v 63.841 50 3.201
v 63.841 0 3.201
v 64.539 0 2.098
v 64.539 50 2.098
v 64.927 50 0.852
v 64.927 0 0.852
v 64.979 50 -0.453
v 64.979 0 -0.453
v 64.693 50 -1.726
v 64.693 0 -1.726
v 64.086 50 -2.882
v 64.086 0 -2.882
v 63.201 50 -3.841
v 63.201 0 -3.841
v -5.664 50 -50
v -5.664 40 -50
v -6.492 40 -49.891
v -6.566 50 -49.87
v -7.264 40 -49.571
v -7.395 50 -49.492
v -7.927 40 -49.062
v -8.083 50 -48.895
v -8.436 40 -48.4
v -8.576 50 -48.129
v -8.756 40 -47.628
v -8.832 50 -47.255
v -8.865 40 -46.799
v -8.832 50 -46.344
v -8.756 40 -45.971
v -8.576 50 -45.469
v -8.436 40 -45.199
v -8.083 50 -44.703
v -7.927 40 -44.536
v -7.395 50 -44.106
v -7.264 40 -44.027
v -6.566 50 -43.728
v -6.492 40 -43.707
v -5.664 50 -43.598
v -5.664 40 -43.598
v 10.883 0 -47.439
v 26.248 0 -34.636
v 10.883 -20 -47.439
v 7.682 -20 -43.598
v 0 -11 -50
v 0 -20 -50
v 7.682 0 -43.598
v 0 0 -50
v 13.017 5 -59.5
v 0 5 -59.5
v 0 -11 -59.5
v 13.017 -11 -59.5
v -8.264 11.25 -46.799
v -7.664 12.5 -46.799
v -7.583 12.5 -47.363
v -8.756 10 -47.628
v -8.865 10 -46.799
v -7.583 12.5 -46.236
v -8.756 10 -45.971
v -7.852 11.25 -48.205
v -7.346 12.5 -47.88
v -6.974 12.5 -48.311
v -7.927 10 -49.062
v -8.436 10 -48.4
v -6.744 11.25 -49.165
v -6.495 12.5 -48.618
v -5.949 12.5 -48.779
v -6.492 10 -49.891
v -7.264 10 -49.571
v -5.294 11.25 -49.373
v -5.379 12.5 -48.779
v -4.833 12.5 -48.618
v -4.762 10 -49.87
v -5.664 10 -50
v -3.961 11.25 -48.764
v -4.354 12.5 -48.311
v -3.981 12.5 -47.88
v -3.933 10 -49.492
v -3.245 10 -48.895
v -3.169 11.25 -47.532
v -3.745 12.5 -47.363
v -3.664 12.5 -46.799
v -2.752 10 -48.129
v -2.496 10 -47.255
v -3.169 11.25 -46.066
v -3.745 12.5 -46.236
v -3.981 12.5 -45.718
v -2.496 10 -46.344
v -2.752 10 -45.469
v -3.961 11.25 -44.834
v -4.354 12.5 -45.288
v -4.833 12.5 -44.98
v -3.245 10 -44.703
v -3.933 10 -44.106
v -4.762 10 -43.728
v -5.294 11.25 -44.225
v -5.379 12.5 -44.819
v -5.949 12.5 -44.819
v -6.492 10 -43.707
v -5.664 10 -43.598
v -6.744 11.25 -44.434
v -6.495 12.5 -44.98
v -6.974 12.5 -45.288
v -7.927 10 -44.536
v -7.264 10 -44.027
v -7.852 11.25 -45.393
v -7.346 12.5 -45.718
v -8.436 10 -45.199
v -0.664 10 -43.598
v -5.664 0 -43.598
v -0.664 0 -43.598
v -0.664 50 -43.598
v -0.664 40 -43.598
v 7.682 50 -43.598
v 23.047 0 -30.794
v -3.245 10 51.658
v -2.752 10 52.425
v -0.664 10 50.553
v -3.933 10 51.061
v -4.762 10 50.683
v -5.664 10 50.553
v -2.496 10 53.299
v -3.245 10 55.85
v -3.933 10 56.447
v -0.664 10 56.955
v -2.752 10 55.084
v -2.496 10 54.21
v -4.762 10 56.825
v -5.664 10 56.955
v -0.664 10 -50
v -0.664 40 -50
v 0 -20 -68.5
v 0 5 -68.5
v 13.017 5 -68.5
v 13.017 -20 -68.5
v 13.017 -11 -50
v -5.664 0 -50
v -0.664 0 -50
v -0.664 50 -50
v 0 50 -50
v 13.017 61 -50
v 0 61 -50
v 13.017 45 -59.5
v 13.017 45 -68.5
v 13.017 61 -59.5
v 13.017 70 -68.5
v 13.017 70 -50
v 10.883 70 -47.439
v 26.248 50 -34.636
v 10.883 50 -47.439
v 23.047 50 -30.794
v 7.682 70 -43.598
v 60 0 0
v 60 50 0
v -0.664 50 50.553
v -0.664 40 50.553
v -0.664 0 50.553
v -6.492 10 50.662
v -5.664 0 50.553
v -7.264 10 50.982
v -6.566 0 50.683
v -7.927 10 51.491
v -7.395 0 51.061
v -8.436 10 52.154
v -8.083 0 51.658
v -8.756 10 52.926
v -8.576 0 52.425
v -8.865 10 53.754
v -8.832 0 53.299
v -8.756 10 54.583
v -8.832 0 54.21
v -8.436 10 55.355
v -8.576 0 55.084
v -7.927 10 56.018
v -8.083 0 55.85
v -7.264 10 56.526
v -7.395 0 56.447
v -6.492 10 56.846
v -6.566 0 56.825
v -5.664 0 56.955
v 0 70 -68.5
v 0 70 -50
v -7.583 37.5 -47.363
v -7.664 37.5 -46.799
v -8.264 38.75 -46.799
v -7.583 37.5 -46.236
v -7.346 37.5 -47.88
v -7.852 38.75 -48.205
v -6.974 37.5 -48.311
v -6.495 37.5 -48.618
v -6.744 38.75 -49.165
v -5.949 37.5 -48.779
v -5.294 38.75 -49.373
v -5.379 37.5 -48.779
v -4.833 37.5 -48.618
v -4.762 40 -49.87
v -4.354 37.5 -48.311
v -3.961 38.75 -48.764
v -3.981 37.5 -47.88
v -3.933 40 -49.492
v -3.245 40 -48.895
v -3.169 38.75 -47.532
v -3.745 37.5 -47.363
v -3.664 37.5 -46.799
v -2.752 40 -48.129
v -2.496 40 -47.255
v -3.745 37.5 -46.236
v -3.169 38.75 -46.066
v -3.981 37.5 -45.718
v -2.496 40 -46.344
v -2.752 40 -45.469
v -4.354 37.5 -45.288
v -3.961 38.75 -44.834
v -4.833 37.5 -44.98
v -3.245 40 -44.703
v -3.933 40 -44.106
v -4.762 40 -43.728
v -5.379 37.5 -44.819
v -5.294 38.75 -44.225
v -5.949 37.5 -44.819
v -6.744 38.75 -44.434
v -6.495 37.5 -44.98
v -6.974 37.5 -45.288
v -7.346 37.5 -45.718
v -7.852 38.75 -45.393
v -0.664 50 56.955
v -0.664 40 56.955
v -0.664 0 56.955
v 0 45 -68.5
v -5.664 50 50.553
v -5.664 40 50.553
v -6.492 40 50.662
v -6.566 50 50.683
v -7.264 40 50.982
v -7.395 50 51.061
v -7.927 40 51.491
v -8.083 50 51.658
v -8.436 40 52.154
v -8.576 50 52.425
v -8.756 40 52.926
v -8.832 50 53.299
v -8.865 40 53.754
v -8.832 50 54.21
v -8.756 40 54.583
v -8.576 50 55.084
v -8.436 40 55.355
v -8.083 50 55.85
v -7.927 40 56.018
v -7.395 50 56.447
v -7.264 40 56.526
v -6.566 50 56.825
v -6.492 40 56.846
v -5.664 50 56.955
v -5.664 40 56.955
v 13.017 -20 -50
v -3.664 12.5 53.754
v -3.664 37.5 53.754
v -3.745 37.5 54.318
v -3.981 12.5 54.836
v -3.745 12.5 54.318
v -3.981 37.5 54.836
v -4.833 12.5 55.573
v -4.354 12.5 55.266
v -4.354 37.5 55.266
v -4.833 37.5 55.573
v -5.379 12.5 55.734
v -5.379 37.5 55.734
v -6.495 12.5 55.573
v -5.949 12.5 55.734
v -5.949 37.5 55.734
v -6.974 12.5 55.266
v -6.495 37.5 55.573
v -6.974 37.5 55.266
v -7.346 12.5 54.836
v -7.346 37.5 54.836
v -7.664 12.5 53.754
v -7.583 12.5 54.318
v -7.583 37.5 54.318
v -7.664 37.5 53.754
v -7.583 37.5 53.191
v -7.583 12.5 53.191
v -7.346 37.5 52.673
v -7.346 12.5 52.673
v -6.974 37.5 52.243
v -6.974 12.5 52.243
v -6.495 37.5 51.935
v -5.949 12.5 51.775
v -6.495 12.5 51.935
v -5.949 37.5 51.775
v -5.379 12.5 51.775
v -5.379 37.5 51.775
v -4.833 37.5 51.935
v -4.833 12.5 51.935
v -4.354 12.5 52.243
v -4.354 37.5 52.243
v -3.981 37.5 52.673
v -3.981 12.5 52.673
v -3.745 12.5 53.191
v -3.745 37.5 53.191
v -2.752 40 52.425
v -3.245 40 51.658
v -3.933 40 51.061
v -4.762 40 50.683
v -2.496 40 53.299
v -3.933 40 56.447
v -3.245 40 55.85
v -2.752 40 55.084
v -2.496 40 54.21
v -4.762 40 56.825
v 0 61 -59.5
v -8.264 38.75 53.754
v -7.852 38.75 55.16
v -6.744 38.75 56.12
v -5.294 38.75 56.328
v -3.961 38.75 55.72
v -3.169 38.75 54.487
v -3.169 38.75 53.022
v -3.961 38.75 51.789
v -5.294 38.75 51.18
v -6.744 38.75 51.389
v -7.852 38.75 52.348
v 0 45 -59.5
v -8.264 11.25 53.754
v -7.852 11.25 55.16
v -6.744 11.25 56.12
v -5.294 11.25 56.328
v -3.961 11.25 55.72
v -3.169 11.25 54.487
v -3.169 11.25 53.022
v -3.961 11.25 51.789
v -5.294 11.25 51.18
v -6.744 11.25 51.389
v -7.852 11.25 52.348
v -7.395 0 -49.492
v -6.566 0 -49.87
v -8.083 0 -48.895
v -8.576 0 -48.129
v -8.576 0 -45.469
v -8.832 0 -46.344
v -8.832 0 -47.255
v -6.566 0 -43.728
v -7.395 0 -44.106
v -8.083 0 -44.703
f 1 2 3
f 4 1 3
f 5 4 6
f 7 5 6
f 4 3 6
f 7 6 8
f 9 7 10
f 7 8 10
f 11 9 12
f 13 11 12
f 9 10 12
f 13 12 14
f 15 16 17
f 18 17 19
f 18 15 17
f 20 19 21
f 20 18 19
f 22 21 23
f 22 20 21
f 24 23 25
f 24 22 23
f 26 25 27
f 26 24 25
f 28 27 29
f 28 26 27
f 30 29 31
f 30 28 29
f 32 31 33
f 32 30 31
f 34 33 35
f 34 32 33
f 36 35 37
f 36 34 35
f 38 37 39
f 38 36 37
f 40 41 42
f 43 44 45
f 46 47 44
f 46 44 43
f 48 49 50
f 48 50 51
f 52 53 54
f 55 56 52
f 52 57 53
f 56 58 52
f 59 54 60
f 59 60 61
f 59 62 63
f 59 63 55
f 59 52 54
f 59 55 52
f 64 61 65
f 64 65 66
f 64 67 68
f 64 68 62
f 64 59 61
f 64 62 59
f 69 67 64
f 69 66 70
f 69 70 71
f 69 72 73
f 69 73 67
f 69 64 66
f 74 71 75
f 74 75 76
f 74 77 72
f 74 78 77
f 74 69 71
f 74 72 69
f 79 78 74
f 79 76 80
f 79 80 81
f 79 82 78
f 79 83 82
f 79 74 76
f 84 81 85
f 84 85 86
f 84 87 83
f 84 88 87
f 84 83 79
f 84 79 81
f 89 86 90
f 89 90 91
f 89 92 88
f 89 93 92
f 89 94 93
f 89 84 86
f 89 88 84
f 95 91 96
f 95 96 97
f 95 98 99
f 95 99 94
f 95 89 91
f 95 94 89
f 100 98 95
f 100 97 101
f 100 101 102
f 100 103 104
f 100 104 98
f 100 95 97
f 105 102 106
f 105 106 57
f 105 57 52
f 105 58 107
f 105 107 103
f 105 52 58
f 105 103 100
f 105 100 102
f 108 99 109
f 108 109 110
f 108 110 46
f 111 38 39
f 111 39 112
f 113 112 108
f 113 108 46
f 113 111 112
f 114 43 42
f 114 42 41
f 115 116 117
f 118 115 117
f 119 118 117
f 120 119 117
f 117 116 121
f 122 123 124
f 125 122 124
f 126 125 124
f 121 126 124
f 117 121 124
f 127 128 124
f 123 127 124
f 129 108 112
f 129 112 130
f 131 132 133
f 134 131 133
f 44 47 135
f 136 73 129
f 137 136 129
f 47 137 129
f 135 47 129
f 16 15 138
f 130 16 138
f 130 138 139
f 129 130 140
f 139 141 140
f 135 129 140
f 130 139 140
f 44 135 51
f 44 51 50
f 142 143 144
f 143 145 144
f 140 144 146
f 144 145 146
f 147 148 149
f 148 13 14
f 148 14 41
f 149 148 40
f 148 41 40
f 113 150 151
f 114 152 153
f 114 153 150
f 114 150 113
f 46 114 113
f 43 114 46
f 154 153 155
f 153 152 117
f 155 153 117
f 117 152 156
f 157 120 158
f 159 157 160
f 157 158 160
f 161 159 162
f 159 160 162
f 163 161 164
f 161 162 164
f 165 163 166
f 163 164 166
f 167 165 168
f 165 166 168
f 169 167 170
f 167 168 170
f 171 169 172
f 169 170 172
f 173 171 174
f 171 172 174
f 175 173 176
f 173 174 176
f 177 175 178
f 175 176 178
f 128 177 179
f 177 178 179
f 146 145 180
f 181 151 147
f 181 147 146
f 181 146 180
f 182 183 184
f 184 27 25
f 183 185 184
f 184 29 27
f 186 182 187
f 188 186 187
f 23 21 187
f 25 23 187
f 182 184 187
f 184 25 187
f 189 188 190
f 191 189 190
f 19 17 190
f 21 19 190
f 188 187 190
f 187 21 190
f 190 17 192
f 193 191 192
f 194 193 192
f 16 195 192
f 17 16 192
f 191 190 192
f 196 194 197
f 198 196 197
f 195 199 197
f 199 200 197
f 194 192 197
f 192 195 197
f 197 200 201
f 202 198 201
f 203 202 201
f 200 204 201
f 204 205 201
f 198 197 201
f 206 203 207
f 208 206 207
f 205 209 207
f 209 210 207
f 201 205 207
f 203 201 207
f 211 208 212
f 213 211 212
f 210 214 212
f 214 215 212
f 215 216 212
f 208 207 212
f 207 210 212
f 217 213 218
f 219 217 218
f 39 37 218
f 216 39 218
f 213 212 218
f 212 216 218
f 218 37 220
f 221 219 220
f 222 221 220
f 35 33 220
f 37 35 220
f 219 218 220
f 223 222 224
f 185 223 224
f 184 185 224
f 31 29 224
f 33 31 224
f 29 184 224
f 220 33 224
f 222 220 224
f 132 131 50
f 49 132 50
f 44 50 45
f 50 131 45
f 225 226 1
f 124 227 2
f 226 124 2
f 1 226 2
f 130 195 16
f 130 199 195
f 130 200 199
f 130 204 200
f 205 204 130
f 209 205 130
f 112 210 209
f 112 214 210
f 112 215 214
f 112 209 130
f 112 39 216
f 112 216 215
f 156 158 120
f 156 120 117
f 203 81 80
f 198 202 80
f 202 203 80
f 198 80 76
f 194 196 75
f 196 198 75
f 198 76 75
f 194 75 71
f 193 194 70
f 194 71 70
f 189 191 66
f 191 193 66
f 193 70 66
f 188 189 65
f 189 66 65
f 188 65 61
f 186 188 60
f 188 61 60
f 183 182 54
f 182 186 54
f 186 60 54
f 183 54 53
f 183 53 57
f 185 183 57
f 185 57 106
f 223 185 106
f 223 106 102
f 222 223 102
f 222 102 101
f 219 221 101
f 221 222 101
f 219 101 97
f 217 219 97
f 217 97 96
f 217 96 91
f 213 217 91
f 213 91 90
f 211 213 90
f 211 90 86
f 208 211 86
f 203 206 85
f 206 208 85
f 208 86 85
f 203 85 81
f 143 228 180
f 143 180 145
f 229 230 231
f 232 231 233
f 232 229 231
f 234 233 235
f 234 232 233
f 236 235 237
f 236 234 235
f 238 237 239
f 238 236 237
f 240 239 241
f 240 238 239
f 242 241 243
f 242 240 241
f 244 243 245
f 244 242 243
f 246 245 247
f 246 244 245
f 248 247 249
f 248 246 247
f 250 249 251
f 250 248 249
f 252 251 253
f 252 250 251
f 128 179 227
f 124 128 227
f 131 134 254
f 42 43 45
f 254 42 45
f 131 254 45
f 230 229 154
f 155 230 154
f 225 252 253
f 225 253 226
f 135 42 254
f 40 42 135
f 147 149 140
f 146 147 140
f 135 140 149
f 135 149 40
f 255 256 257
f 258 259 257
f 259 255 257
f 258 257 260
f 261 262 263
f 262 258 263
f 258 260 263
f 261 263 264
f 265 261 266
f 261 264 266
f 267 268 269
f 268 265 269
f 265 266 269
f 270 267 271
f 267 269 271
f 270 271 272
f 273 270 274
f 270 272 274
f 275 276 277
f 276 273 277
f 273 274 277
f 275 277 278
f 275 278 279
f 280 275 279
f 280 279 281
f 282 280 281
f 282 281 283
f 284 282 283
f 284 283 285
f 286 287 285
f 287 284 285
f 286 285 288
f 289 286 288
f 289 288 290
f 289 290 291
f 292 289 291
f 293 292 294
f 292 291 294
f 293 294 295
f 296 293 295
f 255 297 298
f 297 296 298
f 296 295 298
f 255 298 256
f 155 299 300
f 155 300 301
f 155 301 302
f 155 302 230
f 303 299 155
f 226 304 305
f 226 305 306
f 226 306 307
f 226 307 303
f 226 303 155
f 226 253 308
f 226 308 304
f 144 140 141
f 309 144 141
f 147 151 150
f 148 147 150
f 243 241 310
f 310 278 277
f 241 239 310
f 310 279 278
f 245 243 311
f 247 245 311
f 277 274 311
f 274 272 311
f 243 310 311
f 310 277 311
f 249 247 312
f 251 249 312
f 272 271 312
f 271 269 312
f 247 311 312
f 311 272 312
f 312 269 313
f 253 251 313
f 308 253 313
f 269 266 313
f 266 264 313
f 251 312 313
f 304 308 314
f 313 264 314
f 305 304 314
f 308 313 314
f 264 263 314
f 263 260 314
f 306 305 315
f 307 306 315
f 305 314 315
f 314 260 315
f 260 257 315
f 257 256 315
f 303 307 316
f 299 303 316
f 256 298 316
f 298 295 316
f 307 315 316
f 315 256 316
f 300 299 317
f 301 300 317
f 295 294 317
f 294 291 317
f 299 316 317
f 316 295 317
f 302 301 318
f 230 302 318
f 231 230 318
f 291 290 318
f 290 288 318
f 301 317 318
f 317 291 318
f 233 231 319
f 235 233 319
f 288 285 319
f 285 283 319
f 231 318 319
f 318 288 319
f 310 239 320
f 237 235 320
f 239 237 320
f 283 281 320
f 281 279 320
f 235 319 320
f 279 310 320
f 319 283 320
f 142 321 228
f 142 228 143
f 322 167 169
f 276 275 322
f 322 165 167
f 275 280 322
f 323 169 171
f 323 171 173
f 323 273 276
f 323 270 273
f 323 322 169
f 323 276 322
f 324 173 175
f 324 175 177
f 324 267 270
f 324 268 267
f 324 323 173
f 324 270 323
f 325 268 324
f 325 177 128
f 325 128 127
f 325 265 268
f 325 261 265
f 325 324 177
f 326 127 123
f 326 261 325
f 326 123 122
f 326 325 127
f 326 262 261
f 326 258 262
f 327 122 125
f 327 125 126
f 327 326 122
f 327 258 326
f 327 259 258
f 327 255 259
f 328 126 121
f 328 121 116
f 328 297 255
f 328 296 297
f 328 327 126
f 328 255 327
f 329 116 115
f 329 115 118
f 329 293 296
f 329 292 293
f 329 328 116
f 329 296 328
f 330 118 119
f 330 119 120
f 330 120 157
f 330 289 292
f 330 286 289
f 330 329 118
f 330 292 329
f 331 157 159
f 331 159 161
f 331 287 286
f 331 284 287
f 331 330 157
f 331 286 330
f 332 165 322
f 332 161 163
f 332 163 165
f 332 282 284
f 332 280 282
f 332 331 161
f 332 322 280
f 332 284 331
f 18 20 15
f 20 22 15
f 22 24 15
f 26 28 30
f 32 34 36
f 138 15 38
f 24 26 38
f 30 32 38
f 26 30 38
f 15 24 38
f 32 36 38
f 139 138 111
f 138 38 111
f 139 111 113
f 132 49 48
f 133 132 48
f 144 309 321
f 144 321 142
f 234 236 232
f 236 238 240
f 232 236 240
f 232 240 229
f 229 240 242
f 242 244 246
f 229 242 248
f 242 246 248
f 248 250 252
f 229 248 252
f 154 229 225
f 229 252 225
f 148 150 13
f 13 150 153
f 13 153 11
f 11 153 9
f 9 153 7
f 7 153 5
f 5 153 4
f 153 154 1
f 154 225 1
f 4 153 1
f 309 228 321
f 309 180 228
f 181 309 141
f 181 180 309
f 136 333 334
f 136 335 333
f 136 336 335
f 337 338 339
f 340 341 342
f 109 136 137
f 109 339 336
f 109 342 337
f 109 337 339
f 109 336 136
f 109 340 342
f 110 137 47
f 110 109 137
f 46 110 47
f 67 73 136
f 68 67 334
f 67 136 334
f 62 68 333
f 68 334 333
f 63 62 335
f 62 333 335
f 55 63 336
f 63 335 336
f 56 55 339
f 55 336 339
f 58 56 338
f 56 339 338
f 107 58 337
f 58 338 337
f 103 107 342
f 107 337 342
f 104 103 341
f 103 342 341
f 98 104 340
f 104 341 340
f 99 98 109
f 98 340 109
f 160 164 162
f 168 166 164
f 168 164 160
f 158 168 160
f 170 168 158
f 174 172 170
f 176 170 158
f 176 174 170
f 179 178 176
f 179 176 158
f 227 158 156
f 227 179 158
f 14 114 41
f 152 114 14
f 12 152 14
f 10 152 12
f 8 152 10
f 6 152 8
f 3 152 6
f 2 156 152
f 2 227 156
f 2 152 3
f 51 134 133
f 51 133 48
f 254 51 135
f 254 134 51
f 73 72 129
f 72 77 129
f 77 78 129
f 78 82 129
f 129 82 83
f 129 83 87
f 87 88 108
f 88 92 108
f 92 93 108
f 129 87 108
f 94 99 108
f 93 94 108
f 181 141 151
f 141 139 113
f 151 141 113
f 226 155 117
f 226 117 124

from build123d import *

# Parameters (mm, degrees)
EXTRUDE_1_DEPTH  = 50
EXTRUDE_START    = -50
EXTRUDE_3_DEPTH  = 70
SKETCH_5_W       = 13.017082793
SKETCH_5_H       = 9
EXTRUDE_4_DEPTH  = 18.5
SKETCH_6_W       = 13.017082793
SKETCH_6_H       = 9
EXTRUDE_5_DEPTH  = 16
EXTRUDE_6_DEPTH  = 50
SKETCH_9_W       = 5
SKETCH_9_H       = 6.401843996
EXTRUDE_7_DEPTH  = 10
SKETCH_10_W      = 5
SKETCH_10_H      = 6.401843997
EXTRUDE_8_DEPTH  = 10
SKETCH_11_R      = 2
EXTRUDE_9_DEPTH  = 30
SKETCH_15_R      = 2
EXTRUDE_10_DEPTH = 30
EXTRUDE_11_DEPTH = 5


with BuildPart() as part:
    # 草图1 → 凸台-拉伸1 (new body)
    with BuildSketch(Plane(origin=(0, 0, 0), x_dir=(1, 0, 0), z_dir=(0, 1, 0))):
        with BuildLine():
            Line((7.810249676, 50), (0, 50))
            Line((0, 50), (60, 0))
            Line((60, 0), (-0.663965605, -50.553304671))
            Line((-0.663965605, -50.553304671), (-0.663965605, -56.955148667))
            Line((-0.663965605, -56.955148667), (63.841106398, -3.200921998))
            ThreePointArc((63.841106398, -3.200921998), (64.979466032, 0.45267873), (63.200921998, 3.841106398))
            Line((63.200921998, 3.841106398), (7.810249676, 50))
        make_face()
    extrude(amount=EXTRUDE_1_DEPTH)

    # 草图4 → 凸台-拉伸3 (add)
    with BuildSketch(Plane(origin=(0, 50, 0), x_dir=(1, 0, 0), z_dir=(0, 1, 0)).offset(EXTRUDE_START)):
        Polygon((7.810249676, 50), (0, 50), (7.682212796, 43.598156003), (10.883134794, 47.439262401), align=None)
        Polygon((13.017082793, 50), (7.810249676, 50), (10.883134794, 47.439262401), align=None)
    extrude_3 = extrude(amount=EXTRUDE_3_DEPTH)

    # 草图5 → 凸台-拉伸4 (add)
    with BuildSketch(Plane(origin=(0, 0, -50), x_dir=(-1, 0, 0), z_dir=(0, 0, -1))):
        with Locations((-6.508541397, 65.5)):
            Rectangle(SKETCH_5_W, SKETCH_5_H)
    extrude_4 = extrude(amount=EXTRUDE_4_DEPTH)

    # 草图6 → 凸台-拉伸5 (add)
    with BuildSketch(Plane.XZ.offset(-61)):
        with Locations((6.508541397, -64)):
            Rectangle(SKETCH_6_W, SKETCH_6_H)
    extrude_5 = extrude(amount=EXTRUDE_5_DEPTH)

    # 镜向4: 凸台-拉伸3, 凸台-拉伸4, 凸台-拉伸5 across plane
    add(extrude_3.mirror(Plane(origin=(0, 25, 0), x_dir=(0, 0, 1), z_dir=(0, -1, 0))))
    add(extrude_4.mirror(Plane(origin=(0, 25, 0), x_dir=(0, 0, 1), z_dir=(0, -1, 0))))
    add(extrude_5.mirror(Plane(origin=(0, 25, 0), x_dir=(0, 0, 1), z_dir=(0, -1, 0))))

    # 草图8 → 凸台-拉伸6 (add)
    with BuildSketch(Plane(origin=(0, 50, 0), x_dir=(1, 0, 0), z_dir=(0, 1, 0))):
        Polygon((7.682212796, 43.598156003), (-0.663965605, 43.598156003), (-0.663965605, 50), (0, 50), align=None)
    extrude(amount=-EXTRUDE_6_DEPTH)

    # 草图9 → 凸台-拉伸7 (add)
    with BuildSketch(Plane.XZ):
        with Locations((-3.163965605, 53.754226669)):
            Rectangle(SKETCH_9_W, SKETCH_9_H)
        with BuildLine():
            Line((-5.663965605, 56.955148667), (-5.663965605, 50.553304671))
            ThreePointArc((-5.663965605, 50.553304671), (-8.864887603, 53.754226669), (-5.663965605, 56.955148667))
        make_face()
    extrude_7 = extrude(amount=-EXTRUDE_7_DEPTH)

    # 草图10 → 凸台-拉伸8 (add)
    with BuildSketch(Plane.XZ):
        with Locations((-3.163965605, -46.799078001)):
            Rectangle(SKETCH_10_W, SKETCH_10_H)
        with BuildLine():
            Line((-5.663965605, -43.598156003), (-5.663965605, -50))
            ThreePointArc((-5.663965605, -50), (-8.864887603, -46.799078002), (-5.663965605, -43.598156003))
        make_face()
    extrude_8 = extrude(amount=-EXTRUDE_8_DEPTH)

    # 镜向5: 凸台-拉伸7, 凸台-拉伸8 across plane
    add(extrude_7.mirror(Plane(origin=(0, 25, 0), x_dir=(0, 0, 1), z_dir=(0, -1, 0))))
    add(extrude_8.mirror(Plane(origin=(0, 25, 0), x_dir=(0, 0, 1), z_dir=(0, -1, 0))))

    # 草图11 → 凸台-拉伸9 (add)
    with BuildSketch(Plane.XZ.offset(-40)):
        with Locations((-5.663965605, 53.754226669)):
            Circle(SKETCH_11_R)
    extrude(amount=EXTRUDE_9_DEPTH)

    # 草图14 → 旋转1 (revolve)
    with BuildSketch(Plane(origin=(0, 0, 53.754226669), x_dir=(-1, 0, 0), z_dir=(0, 0, -1))):
        Polygon((7.663965605, 12.5), (7.663965605, 10), (8.864887603, 10), align=None)
        Polygon((7.663965605, 12.5), (8.864887603, 10), (7.663965605, 10), align=None)
    revolve_1 = revolve(axis=Axis((-5.663965605, 10, 53.754226669), (0, 1, 0)))

    # 镜向6: 旋转1 across plane
    add(revolve_1.mirror(Plane(origin=(0, 25, 0), x_dir=(0, 0, 1), z_dir=(0, -1, 0))))

    # 草图15 → 凸台-拉伸10 (add)
    with BuildSketch(Plane(origin=(0, 10, 0), x_dir=(1, 0, 0), z_dir=(0, 1, 0))):
        with Locations((-5.663965605, 46.799078002)):
            Circle(SKETCH_15_R)
    extrude(amount=EXTRUDE_10_DEPTH)

    # 草图17 → 旋转2 (revolve)
    with BuildSketch(Plane.XY.offset(-46.799078002)):
        Polygon((-7.663965605, 10), (-7.663965605, 12.5), (-8.864887603, 10), align=None)
    revolve_2 = revolve(axis=Axis((-5.663965605, 40, -46.799078002), (0, -1, 0)))

    # 镜向7: 旋转2 across plane
    add(revolve_2.mirror(Plane(origin=(0, 25, 0), x_dir=(0, 0, 1), z_dir=(0, -1, 0))))

    # 草图18 → 凸台-拉伸11 (add)
    with BuildSketch(Plane(origin=(24.590163934, 0, -29.508196721), x_dir=(0.76822128, 0, 0.6401844), z_dir=(-0.6401844, 0, 0.76822128))):
        Polygon((-22.009219983, 50), (-22.009219983, 70), (-2.009219983, 50), align=None)
    extrude_11 = extrude(amount=-EXTRUDE_11_DEPTH)

    # 镜向8: 凸台-拉伸11 across plane
    add(extrude_11.mirror(Plane(origin=(0, 25, 0), x_dir=(0, 0, 1), z_dir=(0, -1, 0))))


solid = part.part
